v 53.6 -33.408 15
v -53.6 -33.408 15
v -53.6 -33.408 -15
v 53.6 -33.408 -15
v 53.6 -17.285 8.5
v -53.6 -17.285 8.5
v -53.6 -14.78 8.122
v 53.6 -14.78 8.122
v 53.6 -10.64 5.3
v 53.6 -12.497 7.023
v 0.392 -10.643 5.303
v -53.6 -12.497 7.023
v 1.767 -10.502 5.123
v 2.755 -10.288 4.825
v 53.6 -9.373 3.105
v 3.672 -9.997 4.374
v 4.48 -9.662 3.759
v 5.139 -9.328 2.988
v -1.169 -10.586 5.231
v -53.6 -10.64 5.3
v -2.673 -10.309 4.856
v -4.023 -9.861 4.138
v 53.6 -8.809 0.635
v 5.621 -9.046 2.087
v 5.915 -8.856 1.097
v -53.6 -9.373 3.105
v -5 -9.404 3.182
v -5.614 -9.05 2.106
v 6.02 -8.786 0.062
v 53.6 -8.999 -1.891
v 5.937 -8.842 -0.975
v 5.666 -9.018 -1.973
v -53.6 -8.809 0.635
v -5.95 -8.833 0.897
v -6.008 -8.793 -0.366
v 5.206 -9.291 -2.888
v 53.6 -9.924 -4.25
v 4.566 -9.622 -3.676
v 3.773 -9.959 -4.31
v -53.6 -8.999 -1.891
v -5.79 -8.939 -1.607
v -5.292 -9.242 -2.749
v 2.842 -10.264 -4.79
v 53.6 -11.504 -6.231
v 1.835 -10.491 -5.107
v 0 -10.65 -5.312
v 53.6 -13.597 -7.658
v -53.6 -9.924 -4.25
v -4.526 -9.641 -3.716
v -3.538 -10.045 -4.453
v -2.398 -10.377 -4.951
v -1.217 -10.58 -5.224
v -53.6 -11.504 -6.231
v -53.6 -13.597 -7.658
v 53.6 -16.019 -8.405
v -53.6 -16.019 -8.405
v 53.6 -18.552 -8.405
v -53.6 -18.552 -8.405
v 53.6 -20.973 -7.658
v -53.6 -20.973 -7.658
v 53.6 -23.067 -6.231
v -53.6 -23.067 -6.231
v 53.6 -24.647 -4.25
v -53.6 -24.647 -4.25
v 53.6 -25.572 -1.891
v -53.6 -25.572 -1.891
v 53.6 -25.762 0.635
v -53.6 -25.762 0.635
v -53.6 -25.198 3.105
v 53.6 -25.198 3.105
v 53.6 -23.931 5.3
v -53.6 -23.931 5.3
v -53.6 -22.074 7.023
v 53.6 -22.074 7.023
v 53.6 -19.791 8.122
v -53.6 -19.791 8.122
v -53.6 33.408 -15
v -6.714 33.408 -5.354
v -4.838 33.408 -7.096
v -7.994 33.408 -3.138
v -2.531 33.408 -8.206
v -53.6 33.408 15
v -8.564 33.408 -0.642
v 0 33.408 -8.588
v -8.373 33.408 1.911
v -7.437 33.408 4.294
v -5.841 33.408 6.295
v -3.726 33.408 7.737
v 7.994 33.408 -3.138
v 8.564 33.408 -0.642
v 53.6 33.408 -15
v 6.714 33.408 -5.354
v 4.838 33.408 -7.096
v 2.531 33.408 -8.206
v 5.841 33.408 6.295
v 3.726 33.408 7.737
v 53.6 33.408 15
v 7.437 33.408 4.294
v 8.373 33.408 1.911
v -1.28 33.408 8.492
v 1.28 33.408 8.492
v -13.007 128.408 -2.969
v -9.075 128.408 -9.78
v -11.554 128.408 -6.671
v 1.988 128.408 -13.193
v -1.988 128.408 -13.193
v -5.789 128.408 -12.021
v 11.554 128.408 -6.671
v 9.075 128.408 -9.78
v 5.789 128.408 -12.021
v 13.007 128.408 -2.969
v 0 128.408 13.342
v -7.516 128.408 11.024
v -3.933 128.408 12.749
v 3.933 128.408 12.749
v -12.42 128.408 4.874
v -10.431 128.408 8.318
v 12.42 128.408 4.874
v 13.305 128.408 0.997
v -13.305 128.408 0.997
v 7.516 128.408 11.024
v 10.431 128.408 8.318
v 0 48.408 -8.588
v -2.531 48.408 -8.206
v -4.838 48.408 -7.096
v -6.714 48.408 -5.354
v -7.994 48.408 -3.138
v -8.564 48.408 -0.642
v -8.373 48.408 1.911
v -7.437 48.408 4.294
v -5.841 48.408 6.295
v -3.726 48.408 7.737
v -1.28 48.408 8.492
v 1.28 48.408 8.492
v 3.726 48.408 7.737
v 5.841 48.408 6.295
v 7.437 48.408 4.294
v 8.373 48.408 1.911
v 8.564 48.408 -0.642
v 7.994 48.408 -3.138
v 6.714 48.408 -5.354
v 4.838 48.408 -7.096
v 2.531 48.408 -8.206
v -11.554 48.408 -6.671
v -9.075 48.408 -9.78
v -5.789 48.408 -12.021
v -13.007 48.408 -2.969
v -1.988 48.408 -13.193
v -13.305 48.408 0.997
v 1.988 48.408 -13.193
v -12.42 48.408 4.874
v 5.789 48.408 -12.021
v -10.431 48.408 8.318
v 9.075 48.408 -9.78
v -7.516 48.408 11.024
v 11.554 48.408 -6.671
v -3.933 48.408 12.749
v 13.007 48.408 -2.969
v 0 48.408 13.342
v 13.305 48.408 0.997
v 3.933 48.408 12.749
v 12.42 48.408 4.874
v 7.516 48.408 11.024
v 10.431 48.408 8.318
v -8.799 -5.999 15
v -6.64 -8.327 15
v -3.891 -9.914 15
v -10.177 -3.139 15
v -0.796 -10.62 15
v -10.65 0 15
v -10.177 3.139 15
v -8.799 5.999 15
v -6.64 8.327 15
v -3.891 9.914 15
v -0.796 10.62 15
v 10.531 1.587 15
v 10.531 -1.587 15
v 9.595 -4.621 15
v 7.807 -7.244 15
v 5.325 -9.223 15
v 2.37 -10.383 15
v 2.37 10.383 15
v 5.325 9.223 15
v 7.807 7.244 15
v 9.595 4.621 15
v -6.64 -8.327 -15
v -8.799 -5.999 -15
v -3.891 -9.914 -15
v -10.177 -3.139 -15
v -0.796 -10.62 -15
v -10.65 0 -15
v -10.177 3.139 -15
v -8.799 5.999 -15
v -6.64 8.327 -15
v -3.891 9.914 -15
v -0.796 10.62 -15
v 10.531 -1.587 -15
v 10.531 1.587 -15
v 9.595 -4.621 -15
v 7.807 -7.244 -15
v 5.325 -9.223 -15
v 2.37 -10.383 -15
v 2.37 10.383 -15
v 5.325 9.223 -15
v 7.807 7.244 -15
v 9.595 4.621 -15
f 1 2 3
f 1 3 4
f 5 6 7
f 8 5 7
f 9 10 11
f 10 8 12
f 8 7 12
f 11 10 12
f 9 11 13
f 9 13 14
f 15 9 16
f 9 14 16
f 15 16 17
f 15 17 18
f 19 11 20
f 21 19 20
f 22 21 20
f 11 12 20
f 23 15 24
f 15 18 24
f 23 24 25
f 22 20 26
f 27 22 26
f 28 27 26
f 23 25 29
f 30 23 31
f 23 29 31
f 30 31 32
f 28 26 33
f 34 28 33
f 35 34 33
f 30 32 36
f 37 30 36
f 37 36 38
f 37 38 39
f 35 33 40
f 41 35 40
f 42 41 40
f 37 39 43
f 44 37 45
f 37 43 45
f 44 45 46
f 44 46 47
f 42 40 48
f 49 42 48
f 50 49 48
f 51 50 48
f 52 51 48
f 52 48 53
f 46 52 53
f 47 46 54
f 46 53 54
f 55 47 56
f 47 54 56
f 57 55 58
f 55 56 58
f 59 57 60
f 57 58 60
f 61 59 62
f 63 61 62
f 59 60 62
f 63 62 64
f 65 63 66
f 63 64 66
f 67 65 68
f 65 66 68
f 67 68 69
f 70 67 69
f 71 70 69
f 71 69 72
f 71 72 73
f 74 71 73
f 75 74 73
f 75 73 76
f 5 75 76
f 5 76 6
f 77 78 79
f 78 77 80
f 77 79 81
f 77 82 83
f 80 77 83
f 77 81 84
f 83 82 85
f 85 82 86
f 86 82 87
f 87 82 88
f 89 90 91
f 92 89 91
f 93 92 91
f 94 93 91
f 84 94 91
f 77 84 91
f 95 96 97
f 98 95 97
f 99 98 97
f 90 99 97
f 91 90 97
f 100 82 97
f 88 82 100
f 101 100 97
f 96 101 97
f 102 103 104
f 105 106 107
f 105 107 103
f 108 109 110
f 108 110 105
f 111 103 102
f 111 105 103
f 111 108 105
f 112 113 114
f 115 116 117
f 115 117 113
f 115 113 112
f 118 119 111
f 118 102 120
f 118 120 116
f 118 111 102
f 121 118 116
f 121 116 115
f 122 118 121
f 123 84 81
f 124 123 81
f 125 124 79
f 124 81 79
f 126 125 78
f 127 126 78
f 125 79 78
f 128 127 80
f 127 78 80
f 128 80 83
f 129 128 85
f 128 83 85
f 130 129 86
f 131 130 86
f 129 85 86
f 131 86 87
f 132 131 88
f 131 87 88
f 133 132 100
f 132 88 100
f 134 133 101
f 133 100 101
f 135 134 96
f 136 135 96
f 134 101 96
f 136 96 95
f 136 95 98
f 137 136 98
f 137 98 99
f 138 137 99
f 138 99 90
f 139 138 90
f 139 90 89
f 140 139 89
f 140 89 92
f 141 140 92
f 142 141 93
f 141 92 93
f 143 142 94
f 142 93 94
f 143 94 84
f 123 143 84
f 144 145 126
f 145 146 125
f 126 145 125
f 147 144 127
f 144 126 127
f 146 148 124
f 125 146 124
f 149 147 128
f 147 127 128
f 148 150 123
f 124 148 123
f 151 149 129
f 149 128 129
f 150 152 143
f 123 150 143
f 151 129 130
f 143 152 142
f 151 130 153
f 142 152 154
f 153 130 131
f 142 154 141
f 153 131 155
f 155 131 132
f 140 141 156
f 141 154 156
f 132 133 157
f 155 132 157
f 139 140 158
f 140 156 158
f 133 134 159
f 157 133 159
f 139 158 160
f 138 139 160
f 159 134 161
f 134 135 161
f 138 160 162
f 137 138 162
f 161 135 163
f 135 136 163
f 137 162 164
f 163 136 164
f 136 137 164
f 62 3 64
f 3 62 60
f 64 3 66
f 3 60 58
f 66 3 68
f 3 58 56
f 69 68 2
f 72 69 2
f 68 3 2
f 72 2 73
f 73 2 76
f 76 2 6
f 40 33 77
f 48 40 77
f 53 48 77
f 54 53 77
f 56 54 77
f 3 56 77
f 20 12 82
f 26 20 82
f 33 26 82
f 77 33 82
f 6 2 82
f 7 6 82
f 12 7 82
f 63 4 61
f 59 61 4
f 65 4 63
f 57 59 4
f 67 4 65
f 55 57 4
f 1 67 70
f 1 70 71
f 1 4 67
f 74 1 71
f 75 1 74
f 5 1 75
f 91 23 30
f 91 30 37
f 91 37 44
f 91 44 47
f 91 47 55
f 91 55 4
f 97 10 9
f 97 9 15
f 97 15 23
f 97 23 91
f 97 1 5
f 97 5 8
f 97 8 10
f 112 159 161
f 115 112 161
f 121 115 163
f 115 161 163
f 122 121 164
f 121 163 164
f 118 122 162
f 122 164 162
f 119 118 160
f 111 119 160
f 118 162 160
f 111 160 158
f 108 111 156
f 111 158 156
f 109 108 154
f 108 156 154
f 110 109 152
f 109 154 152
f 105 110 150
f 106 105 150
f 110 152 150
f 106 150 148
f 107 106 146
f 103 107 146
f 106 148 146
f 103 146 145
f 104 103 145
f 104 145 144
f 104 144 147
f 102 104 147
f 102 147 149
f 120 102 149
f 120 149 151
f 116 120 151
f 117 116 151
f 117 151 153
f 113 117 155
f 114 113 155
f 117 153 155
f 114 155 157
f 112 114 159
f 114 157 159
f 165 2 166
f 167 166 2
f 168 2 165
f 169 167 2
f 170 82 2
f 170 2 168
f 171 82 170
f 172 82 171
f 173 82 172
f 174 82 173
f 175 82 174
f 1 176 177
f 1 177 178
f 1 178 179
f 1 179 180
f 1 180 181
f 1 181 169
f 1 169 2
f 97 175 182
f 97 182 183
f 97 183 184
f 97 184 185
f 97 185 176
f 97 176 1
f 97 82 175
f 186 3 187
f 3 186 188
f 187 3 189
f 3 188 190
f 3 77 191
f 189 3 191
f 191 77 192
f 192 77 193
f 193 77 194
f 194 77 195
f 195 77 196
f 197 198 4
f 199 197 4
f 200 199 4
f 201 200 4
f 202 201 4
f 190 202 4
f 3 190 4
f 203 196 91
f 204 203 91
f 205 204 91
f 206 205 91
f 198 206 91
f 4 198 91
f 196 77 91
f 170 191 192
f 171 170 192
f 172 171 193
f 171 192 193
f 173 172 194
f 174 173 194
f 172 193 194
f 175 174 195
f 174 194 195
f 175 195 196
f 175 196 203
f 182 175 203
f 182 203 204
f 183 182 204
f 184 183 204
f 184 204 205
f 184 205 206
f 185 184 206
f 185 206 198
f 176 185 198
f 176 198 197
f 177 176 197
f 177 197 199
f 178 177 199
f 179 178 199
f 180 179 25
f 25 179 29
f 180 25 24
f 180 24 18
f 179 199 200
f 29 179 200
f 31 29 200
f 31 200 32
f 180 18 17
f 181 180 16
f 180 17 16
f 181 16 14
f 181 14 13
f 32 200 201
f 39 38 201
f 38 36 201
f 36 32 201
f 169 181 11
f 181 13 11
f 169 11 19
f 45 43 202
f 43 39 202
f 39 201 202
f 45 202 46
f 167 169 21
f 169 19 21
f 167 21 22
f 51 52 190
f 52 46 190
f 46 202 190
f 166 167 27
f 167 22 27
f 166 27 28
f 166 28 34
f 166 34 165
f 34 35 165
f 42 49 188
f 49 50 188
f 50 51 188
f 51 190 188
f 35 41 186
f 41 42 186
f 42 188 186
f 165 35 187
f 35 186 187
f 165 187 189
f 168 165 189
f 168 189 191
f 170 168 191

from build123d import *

# Parameters (mm, degrees)
SKETCH1_W           = 107.199818646
SKETCH1_H           = 66.816994634
BOSS_EXTRUDE1_DEPTH = 15
SKETCH2_R           = 8.587881919
BOSS_EXTRUDE2_DEPTH = 15
SKETCH3_R           = 13.34182577
BOSS_EXTRUDE3_DEPTH = 80
SKETCH4_R           = 8.5
CUT_EXTRUDE1_DEPTH  = 110
SKETCH5_R           = 10.65
CUT_EXTRUDE2_DEPTH  = 30


with BuildPart() as part:
    # Sketch1 → Boss-Extrude1 (new, symmetric)
    with BuildSketch(Plane.XY):
        Rectangle(SKETCH1_W, SKETCH1_H)
    extrude(amount=BOSS_EXTRUDE1_DEPTH, both=True)

    # Sketch2 → Boss-Extrude2 (add)
    with BuildSketch(Plane(origin=(0, 33.408497317, 0), x_dir=(1, 0, 0), z_dir=(0, 1, 0))):
        with Locations(Location((0, 0, 0), (0, 0, 90))):
            Circle(SKETCH2_R)
    extrude(amount=BOSS_EXTRUDE2_DEPTH)

    # Sketch3 → Boss-Extrude3 (add)
    with BuildSketch(Plane(origin=(0, 48.408497317, 0), x_dir=(1, 0, 0), z_dir=(0, 1, 0))):
        with Locations(Location((0, 0, 0), (0, 0, 270))):
            Circle(SKETCH3_R)
    extrude(amount=BOSS_EXTRUDE3_DEPTH)

    # Sketch4 → Cut-Extrude1 (cut)
    with BuildSketch(Plane.ZY.offset(53.599909323)):
        with Locations((0, -17.285411507)):
            Circle(SKETCH4_R)
    extrude(amount=-CUT_EXTRUDE1_DEPTH, mode=Mode.SUBTRACT)

    # Sketch5 → Cut-Extrude2 (cut)
    with BuildSketch(Plane(origin=(0, 0, -15), x_dir=(-1, 0, 0), z_dir=(0, 0, -1))):
        Circle(SKETCH5_R)
    extrude(amount=-CUT_EXTRUDE2_DEPTH, mode=Mode.SUBTRACT)


solid = part.part
